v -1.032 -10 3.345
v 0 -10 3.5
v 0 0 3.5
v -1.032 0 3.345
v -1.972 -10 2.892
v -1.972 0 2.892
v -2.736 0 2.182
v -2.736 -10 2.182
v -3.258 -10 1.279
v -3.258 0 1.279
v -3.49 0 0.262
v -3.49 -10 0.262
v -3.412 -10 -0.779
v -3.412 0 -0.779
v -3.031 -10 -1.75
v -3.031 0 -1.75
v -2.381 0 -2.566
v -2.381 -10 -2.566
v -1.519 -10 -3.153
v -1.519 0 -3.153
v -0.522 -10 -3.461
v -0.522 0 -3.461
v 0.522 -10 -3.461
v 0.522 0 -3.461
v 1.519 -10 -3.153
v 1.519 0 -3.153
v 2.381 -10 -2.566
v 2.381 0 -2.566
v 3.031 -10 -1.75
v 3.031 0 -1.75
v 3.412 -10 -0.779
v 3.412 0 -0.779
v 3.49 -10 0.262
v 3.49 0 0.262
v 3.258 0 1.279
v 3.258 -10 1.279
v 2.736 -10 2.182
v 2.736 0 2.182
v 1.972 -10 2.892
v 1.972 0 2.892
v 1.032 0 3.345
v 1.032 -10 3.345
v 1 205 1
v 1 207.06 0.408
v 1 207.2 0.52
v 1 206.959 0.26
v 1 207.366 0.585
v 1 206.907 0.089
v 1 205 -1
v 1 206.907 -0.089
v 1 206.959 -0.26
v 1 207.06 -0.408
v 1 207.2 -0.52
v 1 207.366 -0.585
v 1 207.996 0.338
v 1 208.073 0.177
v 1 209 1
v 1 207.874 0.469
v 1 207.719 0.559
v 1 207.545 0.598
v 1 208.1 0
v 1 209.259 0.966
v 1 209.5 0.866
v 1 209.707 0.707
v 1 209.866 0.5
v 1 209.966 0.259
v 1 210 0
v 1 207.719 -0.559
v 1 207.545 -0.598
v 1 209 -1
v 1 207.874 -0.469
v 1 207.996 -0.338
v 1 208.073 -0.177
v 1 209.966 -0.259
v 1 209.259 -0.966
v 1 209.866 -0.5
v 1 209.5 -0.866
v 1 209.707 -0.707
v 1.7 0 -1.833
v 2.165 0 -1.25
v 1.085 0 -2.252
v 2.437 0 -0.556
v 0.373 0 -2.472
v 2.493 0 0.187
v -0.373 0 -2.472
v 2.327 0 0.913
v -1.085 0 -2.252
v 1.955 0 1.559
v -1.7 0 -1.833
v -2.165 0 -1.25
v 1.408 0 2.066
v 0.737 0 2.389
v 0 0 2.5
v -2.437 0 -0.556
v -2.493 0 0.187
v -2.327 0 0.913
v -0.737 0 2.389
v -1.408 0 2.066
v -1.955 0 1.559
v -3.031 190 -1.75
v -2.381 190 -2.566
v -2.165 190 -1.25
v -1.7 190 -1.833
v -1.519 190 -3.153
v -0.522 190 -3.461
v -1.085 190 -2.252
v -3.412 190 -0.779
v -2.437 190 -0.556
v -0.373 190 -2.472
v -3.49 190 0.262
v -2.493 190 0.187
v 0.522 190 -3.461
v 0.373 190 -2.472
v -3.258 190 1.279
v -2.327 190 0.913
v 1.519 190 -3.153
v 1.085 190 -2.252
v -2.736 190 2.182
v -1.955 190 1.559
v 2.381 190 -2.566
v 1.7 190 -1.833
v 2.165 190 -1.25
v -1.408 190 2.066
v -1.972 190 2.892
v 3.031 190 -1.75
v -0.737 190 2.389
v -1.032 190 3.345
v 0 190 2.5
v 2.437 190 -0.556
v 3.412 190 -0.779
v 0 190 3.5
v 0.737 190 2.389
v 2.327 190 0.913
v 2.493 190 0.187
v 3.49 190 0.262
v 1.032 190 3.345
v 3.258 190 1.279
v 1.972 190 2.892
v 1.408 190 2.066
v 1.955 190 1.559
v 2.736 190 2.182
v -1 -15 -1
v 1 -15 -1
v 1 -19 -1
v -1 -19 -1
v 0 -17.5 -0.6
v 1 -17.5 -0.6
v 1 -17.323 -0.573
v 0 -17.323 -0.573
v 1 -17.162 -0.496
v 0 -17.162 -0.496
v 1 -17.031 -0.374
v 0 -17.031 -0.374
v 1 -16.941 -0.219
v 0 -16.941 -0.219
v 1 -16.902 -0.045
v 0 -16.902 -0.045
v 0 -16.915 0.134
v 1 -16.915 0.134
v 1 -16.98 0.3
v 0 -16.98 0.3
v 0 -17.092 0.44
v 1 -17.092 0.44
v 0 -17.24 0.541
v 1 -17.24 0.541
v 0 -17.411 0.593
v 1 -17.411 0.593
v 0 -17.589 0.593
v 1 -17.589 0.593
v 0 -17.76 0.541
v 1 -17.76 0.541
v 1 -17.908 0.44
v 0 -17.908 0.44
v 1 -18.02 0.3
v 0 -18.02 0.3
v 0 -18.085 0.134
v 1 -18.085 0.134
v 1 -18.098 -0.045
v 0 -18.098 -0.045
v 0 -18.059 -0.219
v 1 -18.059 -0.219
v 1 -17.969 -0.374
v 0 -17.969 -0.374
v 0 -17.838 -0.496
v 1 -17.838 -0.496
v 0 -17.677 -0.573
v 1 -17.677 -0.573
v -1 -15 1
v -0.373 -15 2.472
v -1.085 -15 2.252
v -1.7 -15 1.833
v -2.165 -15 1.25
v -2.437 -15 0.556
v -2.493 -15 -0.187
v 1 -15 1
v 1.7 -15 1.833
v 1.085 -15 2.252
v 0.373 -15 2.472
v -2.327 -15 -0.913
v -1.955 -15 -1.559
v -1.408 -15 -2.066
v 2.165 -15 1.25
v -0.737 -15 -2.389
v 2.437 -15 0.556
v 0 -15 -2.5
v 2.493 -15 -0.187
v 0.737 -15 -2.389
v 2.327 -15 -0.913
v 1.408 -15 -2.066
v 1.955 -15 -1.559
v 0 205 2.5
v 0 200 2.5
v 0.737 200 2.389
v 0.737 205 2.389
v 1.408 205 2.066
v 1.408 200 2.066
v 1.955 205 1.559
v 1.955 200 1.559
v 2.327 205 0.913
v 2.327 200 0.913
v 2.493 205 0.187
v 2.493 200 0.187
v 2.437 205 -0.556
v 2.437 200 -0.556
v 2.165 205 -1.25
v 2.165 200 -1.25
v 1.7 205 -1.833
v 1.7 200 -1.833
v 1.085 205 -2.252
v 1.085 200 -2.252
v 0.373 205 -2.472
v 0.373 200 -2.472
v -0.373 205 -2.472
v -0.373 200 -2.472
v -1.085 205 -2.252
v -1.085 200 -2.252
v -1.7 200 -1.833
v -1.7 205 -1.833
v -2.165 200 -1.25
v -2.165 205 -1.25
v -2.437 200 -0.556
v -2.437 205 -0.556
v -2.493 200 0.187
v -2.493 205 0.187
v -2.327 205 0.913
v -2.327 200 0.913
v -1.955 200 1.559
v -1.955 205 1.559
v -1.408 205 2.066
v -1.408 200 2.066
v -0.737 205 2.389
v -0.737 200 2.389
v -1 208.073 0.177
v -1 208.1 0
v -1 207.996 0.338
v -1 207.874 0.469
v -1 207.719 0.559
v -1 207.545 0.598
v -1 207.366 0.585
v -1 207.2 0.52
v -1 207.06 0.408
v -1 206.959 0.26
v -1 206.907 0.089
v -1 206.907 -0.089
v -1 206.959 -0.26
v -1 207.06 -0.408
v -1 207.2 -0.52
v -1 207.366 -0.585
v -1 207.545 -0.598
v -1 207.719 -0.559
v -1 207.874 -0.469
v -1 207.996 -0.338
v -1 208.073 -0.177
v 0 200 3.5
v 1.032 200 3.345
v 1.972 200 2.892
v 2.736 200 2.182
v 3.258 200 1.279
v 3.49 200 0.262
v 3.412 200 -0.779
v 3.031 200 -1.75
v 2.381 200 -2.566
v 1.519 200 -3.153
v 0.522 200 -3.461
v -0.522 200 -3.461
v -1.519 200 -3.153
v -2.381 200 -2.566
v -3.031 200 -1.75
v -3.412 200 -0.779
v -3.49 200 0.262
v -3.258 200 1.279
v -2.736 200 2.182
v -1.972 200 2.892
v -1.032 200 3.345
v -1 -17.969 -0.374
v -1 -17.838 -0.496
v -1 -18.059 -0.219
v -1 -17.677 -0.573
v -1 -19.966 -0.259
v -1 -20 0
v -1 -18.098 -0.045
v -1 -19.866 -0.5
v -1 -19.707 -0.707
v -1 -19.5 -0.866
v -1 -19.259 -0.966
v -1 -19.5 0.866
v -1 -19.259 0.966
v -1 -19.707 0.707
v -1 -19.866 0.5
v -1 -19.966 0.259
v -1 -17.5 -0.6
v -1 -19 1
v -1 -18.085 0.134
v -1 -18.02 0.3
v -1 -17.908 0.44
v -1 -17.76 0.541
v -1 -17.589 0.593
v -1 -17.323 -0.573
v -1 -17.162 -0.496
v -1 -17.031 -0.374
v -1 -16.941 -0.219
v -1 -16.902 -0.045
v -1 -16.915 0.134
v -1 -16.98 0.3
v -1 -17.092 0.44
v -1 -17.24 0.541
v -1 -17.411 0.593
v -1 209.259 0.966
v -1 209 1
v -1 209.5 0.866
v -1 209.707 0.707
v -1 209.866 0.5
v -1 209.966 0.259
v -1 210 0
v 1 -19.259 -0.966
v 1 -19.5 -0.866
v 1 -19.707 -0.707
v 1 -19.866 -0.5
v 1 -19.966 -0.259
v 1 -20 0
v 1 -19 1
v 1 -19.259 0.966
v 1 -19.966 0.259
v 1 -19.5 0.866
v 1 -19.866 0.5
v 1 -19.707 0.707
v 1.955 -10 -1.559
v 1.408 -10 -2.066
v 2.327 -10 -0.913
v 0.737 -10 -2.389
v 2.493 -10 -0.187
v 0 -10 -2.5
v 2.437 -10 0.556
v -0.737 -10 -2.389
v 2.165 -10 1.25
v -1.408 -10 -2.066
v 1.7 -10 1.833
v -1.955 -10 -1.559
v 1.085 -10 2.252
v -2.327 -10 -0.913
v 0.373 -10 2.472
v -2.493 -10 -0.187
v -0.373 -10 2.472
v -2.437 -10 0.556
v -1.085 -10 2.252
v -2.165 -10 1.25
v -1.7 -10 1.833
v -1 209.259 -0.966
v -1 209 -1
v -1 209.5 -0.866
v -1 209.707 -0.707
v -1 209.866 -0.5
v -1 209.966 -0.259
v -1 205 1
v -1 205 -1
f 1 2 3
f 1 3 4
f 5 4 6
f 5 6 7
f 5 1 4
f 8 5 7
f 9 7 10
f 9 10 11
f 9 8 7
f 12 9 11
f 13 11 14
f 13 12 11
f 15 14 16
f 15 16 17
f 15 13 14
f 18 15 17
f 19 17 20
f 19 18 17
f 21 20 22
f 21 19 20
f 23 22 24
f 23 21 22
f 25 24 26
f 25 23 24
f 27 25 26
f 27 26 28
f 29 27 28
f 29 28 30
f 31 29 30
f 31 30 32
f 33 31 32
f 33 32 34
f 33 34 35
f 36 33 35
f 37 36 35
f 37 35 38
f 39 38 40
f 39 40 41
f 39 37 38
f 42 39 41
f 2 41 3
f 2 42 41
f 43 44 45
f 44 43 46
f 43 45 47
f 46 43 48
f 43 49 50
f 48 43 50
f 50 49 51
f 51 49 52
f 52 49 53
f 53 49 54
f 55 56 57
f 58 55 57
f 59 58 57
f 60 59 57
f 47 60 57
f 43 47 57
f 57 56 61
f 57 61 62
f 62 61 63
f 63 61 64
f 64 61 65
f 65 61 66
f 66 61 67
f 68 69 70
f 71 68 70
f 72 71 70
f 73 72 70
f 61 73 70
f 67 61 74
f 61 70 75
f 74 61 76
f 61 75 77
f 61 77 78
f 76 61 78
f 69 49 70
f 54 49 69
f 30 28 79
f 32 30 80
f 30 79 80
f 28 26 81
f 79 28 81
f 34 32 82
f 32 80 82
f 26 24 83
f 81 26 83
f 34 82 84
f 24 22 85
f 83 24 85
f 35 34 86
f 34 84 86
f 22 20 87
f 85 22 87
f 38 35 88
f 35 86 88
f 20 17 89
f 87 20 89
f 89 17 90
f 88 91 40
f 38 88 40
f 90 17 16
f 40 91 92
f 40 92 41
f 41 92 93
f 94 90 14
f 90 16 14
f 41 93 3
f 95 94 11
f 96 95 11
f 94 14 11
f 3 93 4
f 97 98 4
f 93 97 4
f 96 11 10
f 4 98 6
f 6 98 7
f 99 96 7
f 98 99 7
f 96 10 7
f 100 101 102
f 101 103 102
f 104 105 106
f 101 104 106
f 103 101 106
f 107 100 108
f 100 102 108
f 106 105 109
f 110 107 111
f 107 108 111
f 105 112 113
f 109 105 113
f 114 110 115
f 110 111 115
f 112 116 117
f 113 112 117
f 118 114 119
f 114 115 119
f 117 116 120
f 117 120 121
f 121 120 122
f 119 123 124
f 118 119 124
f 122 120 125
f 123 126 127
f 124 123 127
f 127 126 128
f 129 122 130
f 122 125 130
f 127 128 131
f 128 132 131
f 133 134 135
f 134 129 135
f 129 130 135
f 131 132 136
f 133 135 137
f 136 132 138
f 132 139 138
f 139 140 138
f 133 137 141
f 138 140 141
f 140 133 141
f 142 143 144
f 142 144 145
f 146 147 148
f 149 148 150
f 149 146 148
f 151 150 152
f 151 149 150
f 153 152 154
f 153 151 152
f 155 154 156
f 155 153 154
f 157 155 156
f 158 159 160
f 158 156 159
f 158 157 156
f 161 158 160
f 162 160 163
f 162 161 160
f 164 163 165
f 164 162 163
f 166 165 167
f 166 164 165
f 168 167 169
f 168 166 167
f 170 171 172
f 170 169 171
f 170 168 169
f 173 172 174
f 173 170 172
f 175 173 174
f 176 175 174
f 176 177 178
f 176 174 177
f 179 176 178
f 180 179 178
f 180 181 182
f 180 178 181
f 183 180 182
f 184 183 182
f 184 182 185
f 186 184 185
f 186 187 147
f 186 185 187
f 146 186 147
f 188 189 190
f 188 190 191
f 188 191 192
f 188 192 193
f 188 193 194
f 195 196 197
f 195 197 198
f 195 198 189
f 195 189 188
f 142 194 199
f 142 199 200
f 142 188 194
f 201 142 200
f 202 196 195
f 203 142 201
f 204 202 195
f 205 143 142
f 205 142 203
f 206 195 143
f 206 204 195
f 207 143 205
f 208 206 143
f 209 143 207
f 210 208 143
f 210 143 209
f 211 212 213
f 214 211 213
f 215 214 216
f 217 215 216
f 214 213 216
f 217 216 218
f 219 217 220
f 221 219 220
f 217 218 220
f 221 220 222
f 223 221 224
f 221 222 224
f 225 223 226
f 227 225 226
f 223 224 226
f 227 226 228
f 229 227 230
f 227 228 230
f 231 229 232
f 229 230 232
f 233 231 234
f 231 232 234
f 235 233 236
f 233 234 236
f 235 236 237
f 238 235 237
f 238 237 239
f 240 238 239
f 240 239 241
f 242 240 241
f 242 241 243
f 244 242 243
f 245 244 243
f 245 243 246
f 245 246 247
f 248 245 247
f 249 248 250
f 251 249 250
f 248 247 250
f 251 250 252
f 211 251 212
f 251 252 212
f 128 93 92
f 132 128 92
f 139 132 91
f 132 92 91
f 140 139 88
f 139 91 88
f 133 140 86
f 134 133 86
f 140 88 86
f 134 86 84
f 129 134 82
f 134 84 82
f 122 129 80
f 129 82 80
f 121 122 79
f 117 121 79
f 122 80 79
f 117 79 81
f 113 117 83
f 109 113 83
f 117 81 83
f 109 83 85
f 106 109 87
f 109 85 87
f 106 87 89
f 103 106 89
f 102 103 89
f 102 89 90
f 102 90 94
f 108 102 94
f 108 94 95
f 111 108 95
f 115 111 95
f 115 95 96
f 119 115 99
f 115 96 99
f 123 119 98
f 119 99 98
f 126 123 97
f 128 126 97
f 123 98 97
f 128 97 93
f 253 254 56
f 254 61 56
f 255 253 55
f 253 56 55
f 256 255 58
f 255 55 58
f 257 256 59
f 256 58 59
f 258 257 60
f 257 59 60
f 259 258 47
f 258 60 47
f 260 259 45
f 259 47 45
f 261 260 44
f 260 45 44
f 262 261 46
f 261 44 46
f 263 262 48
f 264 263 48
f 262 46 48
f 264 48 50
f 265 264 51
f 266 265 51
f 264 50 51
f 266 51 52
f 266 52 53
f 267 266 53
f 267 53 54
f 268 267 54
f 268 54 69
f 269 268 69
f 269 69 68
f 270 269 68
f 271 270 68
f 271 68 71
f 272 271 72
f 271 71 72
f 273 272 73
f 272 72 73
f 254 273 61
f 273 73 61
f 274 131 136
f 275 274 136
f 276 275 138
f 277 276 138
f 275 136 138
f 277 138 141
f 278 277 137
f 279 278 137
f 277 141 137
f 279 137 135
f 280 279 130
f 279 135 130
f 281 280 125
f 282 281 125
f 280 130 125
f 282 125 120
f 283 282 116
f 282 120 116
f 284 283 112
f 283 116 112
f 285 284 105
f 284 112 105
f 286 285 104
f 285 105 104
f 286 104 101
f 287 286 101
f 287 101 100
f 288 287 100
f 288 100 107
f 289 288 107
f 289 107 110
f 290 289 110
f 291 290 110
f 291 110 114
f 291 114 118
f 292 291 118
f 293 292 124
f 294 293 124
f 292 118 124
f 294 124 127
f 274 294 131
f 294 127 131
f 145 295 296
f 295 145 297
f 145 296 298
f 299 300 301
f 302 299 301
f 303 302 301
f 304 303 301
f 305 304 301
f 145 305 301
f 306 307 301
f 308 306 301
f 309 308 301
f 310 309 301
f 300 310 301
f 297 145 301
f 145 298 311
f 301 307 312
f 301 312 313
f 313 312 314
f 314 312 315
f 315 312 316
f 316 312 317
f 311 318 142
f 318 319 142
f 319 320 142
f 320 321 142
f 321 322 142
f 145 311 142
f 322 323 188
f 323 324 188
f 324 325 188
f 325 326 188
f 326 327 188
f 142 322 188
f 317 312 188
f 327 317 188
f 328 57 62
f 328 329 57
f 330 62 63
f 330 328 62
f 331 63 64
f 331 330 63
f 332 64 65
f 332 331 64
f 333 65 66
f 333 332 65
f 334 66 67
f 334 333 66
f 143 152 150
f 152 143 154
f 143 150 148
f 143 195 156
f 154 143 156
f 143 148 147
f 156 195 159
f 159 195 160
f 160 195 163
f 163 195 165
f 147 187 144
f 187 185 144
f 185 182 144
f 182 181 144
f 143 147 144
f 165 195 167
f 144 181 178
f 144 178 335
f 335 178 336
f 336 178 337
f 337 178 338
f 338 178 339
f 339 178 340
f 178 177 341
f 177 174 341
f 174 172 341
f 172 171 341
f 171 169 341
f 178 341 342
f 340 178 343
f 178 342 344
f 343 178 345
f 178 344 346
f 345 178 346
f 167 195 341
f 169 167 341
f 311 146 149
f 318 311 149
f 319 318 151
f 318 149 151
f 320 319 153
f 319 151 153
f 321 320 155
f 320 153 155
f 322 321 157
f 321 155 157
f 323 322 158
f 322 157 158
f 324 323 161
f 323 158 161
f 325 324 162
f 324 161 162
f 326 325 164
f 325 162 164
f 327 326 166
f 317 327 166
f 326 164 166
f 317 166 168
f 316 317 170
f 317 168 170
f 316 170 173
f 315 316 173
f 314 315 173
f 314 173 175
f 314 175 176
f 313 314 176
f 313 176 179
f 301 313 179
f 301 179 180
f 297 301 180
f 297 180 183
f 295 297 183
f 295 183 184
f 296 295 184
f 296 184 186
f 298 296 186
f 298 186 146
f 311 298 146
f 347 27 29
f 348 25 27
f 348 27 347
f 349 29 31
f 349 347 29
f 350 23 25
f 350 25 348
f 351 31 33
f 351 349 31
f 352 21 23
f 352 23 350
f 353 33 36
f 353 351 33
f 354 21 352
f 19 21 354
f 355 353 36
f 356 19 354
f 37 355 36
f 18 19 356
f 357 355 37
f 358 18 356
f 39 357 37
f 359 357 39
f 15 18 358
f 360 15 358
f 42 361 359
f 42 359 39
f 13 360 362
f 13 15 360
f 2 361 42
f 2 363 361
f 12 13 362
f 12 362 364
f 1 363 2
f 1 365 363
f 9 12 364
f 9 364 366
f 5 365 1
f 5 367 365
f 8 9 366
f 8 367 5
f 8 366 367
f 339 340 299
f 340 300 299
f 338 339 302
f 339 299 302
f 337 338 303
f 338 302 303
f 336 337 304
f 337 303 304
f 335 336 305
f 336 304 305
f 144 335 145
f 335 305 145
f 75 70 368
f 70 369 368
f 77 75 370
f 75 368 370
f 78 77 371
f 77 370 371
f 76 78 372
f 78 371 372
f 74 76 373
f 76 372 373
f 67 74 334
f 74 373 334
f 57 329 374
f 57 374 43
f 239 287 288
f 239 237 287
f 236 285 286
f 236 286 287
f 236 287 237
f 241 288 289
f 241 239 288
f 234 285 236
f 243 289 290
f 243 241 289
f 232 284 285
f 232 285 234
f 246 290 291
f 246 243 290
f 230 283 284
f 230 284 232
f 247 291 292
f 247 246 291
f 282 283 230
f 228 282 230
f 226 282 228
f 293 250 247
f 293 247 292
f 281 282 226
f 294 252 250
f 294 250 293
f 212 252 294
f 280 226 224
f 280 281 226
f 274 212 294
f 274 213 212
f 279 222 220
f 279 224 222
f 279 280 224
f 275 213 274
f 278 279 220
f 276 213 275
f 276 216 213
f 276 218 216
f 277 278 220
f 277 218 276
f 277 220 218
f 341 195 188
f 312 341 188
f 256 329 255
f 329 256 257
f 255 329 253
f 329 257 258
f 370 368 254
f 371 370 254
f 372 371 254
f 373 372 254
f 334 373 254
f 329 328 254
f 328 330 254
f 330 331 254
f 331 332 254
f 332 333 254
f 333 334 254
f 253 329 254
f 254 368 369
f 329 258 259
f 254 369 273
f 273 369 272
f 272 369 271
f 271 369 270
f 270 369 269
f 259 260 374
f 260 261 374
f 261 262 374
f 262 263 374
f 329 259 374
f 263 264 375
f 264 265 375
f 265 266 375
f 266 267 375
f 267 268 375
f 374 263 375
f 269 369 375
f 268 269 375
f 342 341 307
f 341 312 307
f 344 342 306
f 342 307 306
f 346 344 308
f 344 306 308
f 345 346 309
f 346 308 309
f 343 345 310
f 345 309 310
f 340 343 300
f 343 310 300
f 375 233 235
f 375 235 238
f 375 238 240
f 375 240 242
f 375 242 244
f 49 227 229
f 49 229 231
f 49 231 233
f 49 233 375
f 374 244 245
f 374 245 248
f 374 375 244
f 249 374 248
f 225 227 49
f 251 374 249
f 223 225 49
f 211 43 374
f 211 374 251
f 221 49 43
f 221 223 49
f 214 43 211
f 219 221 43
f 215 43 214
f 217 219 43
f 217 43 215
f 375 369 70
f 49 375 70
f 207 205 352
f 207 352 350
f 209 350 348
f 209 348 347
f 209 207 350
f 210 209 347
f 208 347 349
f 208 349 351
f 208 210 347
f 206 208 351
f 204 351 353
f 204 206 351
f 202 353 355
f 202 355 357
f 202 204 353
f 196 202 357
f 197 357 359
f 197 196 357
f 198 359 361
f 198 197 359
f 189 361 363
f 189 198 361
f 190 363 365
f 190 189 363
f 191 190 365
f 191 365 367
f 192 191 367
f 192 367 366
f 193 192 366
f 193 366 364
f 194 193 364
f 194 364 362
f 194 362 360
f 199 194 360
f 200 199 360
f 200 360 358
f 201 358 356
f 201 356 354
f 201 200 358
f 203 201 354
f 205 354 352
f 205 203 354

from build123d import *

# Parameters (mm, degrees)
CROQUIS1_R               = 2.5
SALIENTE_EXTRUIR6_DEPTH  = 190
CROQUIS4_R               = 3.5
SALIENTE_EXTRUIR7_DEPTH  = 10
CROQUIS5_R               = 2.5
SALIENTE_EXTRUIR9_DEPTH  = 5
SALIENTE_EXTRUIR10_START = 10
CROQUIS6_R               = 3.5
SALIENTE_EXTRUIR10_DEPTH = 10
SALIENTE_EXTRUIR11_START = 5
CROQUIS7_R               = 2.5
SALIENTE_EXTRUIR11_DEPTH = 5
SALIENTE_EXTRUIR12_DEPTH = 1
CROQUIS10_R              = 0.6
CORTAR_EXTRUIR1_DEPTH    = 12.5
REDONDEO3_R              = 1
REDONDEO4_R              = 1


with BuildPart() as part:
    # Croquis1 → Saliente-Extruir6 (new body)
    with BuildSketch(Plane(origin=(0, 0, 0), x_dir=(1, 0, 0), z_dir=(0, 1, 0))):
        with Locations(Location((0, 0, 0), (0, 0, 270))):
            Circle(CROQUIS1_R)
    extrude(amount=SALIENTE_EXTRUIR6_DEPTH)

    # Croquis4 → Saliente-Extruir7 (add)
    with BuildSketch(Plane(origin=(0, 190, 0), x_dir=(1, 0, 0), z_dir=(0, 1, 0))):
        with Locations(Location((0, 0, 0), (0, 0, 270))):
            Circle(CROQUIS4_R)
    extrude(amount=SALIENTE_EXTRUIR7_DEPTH)

    # Croquis5 → Saliente-Extruir9 (add)
    with BuildSketch(Plane(origin=(0, 200, 0), x_dir=(1, 0, 0), z_dir=(0, 1, 0))):
        with Locations(Location((0, 0, 0), (0, 0, 270))):
            Circle(CROQUIS5_R)
    extrude(amount=SALIENTE_EXTRUIR9_DEPTH)

    # Croquis6 → Saliente-Extruir10 (add)
    with BuildSketch(Plane.XZ.offset(SALIENTE_EXTRUIR10_START)):
        with Locations(Location((0, 0, 0), (0, 0, 90))):
            Circle(CROQUIS6_R)
    extrude(amount=-SALIENTE_EXTRUIR10_DEPTH)

    # Croquis7 → Saliente-Extruir11 (add)
    with BuildSketch(Plane.XZ.offset(10).offset(SALIENTE_EXTRUIR11_START)):
        with Locations(Location((0, 0, 0), (0, 0, 270))):
            Circle(CROQUIS7_R)
    extrude(amount=-SALIENTE_EXTRUIR11_DEPTH)

    # Croquis8 → Saliente-Extruir12 (add, symmetric)
    with BuildSketch(Plane.XY):
        Polygon((1, 210), (-1, 210), (-1, 205), (0, 205), (1, 205), align=None)
        Polygon((0, -15), (1, -15), (1, -20), (-1, -20), (-1, -15), align=None)
    extrude(amount=SALIENTE_EXTRUIR12_DEPTH, both=True)

    # Croquis10 → Cortar-Extruir1 (cut, symmetric)
    with BuildSketch(Plane(origin=(0, 0, 0), x_dir=(0, 0, -1), z_dir=(1, 0, 0))):
        with Locations((0, -17.5)):
            Circle(CROQUIS10_R)
        with Locations(Location((0, 207.5, 0), (0, 0, 90))):
            Circle(CROQUIS10_R)
    extrude(amount=CORTAR_EXTRUIR1_DEPTH, both=True, mode=Mode.SUBTRACT)

    # Redondeo3
    redondeo3_edges = [part.edges().sort_by_distance(p)[0] for p in [
        (0, -20, 1),
    ]]
    fillet(redondeo3_edges, radius=REDONDEO3_R)

    # Redondeo4
    redondeo4_edges = [part.edges().sort_by_distance(p)[0] for p in [
        (0, 210, 1),
        (0, 210, -1),
        (0, -20, -1),
    ]]
    fillet(redondeo4_edges, radius=REDONDEO4_R - 0.0001)  # a hair under: the kernel refuses the full size


solid = part.part
